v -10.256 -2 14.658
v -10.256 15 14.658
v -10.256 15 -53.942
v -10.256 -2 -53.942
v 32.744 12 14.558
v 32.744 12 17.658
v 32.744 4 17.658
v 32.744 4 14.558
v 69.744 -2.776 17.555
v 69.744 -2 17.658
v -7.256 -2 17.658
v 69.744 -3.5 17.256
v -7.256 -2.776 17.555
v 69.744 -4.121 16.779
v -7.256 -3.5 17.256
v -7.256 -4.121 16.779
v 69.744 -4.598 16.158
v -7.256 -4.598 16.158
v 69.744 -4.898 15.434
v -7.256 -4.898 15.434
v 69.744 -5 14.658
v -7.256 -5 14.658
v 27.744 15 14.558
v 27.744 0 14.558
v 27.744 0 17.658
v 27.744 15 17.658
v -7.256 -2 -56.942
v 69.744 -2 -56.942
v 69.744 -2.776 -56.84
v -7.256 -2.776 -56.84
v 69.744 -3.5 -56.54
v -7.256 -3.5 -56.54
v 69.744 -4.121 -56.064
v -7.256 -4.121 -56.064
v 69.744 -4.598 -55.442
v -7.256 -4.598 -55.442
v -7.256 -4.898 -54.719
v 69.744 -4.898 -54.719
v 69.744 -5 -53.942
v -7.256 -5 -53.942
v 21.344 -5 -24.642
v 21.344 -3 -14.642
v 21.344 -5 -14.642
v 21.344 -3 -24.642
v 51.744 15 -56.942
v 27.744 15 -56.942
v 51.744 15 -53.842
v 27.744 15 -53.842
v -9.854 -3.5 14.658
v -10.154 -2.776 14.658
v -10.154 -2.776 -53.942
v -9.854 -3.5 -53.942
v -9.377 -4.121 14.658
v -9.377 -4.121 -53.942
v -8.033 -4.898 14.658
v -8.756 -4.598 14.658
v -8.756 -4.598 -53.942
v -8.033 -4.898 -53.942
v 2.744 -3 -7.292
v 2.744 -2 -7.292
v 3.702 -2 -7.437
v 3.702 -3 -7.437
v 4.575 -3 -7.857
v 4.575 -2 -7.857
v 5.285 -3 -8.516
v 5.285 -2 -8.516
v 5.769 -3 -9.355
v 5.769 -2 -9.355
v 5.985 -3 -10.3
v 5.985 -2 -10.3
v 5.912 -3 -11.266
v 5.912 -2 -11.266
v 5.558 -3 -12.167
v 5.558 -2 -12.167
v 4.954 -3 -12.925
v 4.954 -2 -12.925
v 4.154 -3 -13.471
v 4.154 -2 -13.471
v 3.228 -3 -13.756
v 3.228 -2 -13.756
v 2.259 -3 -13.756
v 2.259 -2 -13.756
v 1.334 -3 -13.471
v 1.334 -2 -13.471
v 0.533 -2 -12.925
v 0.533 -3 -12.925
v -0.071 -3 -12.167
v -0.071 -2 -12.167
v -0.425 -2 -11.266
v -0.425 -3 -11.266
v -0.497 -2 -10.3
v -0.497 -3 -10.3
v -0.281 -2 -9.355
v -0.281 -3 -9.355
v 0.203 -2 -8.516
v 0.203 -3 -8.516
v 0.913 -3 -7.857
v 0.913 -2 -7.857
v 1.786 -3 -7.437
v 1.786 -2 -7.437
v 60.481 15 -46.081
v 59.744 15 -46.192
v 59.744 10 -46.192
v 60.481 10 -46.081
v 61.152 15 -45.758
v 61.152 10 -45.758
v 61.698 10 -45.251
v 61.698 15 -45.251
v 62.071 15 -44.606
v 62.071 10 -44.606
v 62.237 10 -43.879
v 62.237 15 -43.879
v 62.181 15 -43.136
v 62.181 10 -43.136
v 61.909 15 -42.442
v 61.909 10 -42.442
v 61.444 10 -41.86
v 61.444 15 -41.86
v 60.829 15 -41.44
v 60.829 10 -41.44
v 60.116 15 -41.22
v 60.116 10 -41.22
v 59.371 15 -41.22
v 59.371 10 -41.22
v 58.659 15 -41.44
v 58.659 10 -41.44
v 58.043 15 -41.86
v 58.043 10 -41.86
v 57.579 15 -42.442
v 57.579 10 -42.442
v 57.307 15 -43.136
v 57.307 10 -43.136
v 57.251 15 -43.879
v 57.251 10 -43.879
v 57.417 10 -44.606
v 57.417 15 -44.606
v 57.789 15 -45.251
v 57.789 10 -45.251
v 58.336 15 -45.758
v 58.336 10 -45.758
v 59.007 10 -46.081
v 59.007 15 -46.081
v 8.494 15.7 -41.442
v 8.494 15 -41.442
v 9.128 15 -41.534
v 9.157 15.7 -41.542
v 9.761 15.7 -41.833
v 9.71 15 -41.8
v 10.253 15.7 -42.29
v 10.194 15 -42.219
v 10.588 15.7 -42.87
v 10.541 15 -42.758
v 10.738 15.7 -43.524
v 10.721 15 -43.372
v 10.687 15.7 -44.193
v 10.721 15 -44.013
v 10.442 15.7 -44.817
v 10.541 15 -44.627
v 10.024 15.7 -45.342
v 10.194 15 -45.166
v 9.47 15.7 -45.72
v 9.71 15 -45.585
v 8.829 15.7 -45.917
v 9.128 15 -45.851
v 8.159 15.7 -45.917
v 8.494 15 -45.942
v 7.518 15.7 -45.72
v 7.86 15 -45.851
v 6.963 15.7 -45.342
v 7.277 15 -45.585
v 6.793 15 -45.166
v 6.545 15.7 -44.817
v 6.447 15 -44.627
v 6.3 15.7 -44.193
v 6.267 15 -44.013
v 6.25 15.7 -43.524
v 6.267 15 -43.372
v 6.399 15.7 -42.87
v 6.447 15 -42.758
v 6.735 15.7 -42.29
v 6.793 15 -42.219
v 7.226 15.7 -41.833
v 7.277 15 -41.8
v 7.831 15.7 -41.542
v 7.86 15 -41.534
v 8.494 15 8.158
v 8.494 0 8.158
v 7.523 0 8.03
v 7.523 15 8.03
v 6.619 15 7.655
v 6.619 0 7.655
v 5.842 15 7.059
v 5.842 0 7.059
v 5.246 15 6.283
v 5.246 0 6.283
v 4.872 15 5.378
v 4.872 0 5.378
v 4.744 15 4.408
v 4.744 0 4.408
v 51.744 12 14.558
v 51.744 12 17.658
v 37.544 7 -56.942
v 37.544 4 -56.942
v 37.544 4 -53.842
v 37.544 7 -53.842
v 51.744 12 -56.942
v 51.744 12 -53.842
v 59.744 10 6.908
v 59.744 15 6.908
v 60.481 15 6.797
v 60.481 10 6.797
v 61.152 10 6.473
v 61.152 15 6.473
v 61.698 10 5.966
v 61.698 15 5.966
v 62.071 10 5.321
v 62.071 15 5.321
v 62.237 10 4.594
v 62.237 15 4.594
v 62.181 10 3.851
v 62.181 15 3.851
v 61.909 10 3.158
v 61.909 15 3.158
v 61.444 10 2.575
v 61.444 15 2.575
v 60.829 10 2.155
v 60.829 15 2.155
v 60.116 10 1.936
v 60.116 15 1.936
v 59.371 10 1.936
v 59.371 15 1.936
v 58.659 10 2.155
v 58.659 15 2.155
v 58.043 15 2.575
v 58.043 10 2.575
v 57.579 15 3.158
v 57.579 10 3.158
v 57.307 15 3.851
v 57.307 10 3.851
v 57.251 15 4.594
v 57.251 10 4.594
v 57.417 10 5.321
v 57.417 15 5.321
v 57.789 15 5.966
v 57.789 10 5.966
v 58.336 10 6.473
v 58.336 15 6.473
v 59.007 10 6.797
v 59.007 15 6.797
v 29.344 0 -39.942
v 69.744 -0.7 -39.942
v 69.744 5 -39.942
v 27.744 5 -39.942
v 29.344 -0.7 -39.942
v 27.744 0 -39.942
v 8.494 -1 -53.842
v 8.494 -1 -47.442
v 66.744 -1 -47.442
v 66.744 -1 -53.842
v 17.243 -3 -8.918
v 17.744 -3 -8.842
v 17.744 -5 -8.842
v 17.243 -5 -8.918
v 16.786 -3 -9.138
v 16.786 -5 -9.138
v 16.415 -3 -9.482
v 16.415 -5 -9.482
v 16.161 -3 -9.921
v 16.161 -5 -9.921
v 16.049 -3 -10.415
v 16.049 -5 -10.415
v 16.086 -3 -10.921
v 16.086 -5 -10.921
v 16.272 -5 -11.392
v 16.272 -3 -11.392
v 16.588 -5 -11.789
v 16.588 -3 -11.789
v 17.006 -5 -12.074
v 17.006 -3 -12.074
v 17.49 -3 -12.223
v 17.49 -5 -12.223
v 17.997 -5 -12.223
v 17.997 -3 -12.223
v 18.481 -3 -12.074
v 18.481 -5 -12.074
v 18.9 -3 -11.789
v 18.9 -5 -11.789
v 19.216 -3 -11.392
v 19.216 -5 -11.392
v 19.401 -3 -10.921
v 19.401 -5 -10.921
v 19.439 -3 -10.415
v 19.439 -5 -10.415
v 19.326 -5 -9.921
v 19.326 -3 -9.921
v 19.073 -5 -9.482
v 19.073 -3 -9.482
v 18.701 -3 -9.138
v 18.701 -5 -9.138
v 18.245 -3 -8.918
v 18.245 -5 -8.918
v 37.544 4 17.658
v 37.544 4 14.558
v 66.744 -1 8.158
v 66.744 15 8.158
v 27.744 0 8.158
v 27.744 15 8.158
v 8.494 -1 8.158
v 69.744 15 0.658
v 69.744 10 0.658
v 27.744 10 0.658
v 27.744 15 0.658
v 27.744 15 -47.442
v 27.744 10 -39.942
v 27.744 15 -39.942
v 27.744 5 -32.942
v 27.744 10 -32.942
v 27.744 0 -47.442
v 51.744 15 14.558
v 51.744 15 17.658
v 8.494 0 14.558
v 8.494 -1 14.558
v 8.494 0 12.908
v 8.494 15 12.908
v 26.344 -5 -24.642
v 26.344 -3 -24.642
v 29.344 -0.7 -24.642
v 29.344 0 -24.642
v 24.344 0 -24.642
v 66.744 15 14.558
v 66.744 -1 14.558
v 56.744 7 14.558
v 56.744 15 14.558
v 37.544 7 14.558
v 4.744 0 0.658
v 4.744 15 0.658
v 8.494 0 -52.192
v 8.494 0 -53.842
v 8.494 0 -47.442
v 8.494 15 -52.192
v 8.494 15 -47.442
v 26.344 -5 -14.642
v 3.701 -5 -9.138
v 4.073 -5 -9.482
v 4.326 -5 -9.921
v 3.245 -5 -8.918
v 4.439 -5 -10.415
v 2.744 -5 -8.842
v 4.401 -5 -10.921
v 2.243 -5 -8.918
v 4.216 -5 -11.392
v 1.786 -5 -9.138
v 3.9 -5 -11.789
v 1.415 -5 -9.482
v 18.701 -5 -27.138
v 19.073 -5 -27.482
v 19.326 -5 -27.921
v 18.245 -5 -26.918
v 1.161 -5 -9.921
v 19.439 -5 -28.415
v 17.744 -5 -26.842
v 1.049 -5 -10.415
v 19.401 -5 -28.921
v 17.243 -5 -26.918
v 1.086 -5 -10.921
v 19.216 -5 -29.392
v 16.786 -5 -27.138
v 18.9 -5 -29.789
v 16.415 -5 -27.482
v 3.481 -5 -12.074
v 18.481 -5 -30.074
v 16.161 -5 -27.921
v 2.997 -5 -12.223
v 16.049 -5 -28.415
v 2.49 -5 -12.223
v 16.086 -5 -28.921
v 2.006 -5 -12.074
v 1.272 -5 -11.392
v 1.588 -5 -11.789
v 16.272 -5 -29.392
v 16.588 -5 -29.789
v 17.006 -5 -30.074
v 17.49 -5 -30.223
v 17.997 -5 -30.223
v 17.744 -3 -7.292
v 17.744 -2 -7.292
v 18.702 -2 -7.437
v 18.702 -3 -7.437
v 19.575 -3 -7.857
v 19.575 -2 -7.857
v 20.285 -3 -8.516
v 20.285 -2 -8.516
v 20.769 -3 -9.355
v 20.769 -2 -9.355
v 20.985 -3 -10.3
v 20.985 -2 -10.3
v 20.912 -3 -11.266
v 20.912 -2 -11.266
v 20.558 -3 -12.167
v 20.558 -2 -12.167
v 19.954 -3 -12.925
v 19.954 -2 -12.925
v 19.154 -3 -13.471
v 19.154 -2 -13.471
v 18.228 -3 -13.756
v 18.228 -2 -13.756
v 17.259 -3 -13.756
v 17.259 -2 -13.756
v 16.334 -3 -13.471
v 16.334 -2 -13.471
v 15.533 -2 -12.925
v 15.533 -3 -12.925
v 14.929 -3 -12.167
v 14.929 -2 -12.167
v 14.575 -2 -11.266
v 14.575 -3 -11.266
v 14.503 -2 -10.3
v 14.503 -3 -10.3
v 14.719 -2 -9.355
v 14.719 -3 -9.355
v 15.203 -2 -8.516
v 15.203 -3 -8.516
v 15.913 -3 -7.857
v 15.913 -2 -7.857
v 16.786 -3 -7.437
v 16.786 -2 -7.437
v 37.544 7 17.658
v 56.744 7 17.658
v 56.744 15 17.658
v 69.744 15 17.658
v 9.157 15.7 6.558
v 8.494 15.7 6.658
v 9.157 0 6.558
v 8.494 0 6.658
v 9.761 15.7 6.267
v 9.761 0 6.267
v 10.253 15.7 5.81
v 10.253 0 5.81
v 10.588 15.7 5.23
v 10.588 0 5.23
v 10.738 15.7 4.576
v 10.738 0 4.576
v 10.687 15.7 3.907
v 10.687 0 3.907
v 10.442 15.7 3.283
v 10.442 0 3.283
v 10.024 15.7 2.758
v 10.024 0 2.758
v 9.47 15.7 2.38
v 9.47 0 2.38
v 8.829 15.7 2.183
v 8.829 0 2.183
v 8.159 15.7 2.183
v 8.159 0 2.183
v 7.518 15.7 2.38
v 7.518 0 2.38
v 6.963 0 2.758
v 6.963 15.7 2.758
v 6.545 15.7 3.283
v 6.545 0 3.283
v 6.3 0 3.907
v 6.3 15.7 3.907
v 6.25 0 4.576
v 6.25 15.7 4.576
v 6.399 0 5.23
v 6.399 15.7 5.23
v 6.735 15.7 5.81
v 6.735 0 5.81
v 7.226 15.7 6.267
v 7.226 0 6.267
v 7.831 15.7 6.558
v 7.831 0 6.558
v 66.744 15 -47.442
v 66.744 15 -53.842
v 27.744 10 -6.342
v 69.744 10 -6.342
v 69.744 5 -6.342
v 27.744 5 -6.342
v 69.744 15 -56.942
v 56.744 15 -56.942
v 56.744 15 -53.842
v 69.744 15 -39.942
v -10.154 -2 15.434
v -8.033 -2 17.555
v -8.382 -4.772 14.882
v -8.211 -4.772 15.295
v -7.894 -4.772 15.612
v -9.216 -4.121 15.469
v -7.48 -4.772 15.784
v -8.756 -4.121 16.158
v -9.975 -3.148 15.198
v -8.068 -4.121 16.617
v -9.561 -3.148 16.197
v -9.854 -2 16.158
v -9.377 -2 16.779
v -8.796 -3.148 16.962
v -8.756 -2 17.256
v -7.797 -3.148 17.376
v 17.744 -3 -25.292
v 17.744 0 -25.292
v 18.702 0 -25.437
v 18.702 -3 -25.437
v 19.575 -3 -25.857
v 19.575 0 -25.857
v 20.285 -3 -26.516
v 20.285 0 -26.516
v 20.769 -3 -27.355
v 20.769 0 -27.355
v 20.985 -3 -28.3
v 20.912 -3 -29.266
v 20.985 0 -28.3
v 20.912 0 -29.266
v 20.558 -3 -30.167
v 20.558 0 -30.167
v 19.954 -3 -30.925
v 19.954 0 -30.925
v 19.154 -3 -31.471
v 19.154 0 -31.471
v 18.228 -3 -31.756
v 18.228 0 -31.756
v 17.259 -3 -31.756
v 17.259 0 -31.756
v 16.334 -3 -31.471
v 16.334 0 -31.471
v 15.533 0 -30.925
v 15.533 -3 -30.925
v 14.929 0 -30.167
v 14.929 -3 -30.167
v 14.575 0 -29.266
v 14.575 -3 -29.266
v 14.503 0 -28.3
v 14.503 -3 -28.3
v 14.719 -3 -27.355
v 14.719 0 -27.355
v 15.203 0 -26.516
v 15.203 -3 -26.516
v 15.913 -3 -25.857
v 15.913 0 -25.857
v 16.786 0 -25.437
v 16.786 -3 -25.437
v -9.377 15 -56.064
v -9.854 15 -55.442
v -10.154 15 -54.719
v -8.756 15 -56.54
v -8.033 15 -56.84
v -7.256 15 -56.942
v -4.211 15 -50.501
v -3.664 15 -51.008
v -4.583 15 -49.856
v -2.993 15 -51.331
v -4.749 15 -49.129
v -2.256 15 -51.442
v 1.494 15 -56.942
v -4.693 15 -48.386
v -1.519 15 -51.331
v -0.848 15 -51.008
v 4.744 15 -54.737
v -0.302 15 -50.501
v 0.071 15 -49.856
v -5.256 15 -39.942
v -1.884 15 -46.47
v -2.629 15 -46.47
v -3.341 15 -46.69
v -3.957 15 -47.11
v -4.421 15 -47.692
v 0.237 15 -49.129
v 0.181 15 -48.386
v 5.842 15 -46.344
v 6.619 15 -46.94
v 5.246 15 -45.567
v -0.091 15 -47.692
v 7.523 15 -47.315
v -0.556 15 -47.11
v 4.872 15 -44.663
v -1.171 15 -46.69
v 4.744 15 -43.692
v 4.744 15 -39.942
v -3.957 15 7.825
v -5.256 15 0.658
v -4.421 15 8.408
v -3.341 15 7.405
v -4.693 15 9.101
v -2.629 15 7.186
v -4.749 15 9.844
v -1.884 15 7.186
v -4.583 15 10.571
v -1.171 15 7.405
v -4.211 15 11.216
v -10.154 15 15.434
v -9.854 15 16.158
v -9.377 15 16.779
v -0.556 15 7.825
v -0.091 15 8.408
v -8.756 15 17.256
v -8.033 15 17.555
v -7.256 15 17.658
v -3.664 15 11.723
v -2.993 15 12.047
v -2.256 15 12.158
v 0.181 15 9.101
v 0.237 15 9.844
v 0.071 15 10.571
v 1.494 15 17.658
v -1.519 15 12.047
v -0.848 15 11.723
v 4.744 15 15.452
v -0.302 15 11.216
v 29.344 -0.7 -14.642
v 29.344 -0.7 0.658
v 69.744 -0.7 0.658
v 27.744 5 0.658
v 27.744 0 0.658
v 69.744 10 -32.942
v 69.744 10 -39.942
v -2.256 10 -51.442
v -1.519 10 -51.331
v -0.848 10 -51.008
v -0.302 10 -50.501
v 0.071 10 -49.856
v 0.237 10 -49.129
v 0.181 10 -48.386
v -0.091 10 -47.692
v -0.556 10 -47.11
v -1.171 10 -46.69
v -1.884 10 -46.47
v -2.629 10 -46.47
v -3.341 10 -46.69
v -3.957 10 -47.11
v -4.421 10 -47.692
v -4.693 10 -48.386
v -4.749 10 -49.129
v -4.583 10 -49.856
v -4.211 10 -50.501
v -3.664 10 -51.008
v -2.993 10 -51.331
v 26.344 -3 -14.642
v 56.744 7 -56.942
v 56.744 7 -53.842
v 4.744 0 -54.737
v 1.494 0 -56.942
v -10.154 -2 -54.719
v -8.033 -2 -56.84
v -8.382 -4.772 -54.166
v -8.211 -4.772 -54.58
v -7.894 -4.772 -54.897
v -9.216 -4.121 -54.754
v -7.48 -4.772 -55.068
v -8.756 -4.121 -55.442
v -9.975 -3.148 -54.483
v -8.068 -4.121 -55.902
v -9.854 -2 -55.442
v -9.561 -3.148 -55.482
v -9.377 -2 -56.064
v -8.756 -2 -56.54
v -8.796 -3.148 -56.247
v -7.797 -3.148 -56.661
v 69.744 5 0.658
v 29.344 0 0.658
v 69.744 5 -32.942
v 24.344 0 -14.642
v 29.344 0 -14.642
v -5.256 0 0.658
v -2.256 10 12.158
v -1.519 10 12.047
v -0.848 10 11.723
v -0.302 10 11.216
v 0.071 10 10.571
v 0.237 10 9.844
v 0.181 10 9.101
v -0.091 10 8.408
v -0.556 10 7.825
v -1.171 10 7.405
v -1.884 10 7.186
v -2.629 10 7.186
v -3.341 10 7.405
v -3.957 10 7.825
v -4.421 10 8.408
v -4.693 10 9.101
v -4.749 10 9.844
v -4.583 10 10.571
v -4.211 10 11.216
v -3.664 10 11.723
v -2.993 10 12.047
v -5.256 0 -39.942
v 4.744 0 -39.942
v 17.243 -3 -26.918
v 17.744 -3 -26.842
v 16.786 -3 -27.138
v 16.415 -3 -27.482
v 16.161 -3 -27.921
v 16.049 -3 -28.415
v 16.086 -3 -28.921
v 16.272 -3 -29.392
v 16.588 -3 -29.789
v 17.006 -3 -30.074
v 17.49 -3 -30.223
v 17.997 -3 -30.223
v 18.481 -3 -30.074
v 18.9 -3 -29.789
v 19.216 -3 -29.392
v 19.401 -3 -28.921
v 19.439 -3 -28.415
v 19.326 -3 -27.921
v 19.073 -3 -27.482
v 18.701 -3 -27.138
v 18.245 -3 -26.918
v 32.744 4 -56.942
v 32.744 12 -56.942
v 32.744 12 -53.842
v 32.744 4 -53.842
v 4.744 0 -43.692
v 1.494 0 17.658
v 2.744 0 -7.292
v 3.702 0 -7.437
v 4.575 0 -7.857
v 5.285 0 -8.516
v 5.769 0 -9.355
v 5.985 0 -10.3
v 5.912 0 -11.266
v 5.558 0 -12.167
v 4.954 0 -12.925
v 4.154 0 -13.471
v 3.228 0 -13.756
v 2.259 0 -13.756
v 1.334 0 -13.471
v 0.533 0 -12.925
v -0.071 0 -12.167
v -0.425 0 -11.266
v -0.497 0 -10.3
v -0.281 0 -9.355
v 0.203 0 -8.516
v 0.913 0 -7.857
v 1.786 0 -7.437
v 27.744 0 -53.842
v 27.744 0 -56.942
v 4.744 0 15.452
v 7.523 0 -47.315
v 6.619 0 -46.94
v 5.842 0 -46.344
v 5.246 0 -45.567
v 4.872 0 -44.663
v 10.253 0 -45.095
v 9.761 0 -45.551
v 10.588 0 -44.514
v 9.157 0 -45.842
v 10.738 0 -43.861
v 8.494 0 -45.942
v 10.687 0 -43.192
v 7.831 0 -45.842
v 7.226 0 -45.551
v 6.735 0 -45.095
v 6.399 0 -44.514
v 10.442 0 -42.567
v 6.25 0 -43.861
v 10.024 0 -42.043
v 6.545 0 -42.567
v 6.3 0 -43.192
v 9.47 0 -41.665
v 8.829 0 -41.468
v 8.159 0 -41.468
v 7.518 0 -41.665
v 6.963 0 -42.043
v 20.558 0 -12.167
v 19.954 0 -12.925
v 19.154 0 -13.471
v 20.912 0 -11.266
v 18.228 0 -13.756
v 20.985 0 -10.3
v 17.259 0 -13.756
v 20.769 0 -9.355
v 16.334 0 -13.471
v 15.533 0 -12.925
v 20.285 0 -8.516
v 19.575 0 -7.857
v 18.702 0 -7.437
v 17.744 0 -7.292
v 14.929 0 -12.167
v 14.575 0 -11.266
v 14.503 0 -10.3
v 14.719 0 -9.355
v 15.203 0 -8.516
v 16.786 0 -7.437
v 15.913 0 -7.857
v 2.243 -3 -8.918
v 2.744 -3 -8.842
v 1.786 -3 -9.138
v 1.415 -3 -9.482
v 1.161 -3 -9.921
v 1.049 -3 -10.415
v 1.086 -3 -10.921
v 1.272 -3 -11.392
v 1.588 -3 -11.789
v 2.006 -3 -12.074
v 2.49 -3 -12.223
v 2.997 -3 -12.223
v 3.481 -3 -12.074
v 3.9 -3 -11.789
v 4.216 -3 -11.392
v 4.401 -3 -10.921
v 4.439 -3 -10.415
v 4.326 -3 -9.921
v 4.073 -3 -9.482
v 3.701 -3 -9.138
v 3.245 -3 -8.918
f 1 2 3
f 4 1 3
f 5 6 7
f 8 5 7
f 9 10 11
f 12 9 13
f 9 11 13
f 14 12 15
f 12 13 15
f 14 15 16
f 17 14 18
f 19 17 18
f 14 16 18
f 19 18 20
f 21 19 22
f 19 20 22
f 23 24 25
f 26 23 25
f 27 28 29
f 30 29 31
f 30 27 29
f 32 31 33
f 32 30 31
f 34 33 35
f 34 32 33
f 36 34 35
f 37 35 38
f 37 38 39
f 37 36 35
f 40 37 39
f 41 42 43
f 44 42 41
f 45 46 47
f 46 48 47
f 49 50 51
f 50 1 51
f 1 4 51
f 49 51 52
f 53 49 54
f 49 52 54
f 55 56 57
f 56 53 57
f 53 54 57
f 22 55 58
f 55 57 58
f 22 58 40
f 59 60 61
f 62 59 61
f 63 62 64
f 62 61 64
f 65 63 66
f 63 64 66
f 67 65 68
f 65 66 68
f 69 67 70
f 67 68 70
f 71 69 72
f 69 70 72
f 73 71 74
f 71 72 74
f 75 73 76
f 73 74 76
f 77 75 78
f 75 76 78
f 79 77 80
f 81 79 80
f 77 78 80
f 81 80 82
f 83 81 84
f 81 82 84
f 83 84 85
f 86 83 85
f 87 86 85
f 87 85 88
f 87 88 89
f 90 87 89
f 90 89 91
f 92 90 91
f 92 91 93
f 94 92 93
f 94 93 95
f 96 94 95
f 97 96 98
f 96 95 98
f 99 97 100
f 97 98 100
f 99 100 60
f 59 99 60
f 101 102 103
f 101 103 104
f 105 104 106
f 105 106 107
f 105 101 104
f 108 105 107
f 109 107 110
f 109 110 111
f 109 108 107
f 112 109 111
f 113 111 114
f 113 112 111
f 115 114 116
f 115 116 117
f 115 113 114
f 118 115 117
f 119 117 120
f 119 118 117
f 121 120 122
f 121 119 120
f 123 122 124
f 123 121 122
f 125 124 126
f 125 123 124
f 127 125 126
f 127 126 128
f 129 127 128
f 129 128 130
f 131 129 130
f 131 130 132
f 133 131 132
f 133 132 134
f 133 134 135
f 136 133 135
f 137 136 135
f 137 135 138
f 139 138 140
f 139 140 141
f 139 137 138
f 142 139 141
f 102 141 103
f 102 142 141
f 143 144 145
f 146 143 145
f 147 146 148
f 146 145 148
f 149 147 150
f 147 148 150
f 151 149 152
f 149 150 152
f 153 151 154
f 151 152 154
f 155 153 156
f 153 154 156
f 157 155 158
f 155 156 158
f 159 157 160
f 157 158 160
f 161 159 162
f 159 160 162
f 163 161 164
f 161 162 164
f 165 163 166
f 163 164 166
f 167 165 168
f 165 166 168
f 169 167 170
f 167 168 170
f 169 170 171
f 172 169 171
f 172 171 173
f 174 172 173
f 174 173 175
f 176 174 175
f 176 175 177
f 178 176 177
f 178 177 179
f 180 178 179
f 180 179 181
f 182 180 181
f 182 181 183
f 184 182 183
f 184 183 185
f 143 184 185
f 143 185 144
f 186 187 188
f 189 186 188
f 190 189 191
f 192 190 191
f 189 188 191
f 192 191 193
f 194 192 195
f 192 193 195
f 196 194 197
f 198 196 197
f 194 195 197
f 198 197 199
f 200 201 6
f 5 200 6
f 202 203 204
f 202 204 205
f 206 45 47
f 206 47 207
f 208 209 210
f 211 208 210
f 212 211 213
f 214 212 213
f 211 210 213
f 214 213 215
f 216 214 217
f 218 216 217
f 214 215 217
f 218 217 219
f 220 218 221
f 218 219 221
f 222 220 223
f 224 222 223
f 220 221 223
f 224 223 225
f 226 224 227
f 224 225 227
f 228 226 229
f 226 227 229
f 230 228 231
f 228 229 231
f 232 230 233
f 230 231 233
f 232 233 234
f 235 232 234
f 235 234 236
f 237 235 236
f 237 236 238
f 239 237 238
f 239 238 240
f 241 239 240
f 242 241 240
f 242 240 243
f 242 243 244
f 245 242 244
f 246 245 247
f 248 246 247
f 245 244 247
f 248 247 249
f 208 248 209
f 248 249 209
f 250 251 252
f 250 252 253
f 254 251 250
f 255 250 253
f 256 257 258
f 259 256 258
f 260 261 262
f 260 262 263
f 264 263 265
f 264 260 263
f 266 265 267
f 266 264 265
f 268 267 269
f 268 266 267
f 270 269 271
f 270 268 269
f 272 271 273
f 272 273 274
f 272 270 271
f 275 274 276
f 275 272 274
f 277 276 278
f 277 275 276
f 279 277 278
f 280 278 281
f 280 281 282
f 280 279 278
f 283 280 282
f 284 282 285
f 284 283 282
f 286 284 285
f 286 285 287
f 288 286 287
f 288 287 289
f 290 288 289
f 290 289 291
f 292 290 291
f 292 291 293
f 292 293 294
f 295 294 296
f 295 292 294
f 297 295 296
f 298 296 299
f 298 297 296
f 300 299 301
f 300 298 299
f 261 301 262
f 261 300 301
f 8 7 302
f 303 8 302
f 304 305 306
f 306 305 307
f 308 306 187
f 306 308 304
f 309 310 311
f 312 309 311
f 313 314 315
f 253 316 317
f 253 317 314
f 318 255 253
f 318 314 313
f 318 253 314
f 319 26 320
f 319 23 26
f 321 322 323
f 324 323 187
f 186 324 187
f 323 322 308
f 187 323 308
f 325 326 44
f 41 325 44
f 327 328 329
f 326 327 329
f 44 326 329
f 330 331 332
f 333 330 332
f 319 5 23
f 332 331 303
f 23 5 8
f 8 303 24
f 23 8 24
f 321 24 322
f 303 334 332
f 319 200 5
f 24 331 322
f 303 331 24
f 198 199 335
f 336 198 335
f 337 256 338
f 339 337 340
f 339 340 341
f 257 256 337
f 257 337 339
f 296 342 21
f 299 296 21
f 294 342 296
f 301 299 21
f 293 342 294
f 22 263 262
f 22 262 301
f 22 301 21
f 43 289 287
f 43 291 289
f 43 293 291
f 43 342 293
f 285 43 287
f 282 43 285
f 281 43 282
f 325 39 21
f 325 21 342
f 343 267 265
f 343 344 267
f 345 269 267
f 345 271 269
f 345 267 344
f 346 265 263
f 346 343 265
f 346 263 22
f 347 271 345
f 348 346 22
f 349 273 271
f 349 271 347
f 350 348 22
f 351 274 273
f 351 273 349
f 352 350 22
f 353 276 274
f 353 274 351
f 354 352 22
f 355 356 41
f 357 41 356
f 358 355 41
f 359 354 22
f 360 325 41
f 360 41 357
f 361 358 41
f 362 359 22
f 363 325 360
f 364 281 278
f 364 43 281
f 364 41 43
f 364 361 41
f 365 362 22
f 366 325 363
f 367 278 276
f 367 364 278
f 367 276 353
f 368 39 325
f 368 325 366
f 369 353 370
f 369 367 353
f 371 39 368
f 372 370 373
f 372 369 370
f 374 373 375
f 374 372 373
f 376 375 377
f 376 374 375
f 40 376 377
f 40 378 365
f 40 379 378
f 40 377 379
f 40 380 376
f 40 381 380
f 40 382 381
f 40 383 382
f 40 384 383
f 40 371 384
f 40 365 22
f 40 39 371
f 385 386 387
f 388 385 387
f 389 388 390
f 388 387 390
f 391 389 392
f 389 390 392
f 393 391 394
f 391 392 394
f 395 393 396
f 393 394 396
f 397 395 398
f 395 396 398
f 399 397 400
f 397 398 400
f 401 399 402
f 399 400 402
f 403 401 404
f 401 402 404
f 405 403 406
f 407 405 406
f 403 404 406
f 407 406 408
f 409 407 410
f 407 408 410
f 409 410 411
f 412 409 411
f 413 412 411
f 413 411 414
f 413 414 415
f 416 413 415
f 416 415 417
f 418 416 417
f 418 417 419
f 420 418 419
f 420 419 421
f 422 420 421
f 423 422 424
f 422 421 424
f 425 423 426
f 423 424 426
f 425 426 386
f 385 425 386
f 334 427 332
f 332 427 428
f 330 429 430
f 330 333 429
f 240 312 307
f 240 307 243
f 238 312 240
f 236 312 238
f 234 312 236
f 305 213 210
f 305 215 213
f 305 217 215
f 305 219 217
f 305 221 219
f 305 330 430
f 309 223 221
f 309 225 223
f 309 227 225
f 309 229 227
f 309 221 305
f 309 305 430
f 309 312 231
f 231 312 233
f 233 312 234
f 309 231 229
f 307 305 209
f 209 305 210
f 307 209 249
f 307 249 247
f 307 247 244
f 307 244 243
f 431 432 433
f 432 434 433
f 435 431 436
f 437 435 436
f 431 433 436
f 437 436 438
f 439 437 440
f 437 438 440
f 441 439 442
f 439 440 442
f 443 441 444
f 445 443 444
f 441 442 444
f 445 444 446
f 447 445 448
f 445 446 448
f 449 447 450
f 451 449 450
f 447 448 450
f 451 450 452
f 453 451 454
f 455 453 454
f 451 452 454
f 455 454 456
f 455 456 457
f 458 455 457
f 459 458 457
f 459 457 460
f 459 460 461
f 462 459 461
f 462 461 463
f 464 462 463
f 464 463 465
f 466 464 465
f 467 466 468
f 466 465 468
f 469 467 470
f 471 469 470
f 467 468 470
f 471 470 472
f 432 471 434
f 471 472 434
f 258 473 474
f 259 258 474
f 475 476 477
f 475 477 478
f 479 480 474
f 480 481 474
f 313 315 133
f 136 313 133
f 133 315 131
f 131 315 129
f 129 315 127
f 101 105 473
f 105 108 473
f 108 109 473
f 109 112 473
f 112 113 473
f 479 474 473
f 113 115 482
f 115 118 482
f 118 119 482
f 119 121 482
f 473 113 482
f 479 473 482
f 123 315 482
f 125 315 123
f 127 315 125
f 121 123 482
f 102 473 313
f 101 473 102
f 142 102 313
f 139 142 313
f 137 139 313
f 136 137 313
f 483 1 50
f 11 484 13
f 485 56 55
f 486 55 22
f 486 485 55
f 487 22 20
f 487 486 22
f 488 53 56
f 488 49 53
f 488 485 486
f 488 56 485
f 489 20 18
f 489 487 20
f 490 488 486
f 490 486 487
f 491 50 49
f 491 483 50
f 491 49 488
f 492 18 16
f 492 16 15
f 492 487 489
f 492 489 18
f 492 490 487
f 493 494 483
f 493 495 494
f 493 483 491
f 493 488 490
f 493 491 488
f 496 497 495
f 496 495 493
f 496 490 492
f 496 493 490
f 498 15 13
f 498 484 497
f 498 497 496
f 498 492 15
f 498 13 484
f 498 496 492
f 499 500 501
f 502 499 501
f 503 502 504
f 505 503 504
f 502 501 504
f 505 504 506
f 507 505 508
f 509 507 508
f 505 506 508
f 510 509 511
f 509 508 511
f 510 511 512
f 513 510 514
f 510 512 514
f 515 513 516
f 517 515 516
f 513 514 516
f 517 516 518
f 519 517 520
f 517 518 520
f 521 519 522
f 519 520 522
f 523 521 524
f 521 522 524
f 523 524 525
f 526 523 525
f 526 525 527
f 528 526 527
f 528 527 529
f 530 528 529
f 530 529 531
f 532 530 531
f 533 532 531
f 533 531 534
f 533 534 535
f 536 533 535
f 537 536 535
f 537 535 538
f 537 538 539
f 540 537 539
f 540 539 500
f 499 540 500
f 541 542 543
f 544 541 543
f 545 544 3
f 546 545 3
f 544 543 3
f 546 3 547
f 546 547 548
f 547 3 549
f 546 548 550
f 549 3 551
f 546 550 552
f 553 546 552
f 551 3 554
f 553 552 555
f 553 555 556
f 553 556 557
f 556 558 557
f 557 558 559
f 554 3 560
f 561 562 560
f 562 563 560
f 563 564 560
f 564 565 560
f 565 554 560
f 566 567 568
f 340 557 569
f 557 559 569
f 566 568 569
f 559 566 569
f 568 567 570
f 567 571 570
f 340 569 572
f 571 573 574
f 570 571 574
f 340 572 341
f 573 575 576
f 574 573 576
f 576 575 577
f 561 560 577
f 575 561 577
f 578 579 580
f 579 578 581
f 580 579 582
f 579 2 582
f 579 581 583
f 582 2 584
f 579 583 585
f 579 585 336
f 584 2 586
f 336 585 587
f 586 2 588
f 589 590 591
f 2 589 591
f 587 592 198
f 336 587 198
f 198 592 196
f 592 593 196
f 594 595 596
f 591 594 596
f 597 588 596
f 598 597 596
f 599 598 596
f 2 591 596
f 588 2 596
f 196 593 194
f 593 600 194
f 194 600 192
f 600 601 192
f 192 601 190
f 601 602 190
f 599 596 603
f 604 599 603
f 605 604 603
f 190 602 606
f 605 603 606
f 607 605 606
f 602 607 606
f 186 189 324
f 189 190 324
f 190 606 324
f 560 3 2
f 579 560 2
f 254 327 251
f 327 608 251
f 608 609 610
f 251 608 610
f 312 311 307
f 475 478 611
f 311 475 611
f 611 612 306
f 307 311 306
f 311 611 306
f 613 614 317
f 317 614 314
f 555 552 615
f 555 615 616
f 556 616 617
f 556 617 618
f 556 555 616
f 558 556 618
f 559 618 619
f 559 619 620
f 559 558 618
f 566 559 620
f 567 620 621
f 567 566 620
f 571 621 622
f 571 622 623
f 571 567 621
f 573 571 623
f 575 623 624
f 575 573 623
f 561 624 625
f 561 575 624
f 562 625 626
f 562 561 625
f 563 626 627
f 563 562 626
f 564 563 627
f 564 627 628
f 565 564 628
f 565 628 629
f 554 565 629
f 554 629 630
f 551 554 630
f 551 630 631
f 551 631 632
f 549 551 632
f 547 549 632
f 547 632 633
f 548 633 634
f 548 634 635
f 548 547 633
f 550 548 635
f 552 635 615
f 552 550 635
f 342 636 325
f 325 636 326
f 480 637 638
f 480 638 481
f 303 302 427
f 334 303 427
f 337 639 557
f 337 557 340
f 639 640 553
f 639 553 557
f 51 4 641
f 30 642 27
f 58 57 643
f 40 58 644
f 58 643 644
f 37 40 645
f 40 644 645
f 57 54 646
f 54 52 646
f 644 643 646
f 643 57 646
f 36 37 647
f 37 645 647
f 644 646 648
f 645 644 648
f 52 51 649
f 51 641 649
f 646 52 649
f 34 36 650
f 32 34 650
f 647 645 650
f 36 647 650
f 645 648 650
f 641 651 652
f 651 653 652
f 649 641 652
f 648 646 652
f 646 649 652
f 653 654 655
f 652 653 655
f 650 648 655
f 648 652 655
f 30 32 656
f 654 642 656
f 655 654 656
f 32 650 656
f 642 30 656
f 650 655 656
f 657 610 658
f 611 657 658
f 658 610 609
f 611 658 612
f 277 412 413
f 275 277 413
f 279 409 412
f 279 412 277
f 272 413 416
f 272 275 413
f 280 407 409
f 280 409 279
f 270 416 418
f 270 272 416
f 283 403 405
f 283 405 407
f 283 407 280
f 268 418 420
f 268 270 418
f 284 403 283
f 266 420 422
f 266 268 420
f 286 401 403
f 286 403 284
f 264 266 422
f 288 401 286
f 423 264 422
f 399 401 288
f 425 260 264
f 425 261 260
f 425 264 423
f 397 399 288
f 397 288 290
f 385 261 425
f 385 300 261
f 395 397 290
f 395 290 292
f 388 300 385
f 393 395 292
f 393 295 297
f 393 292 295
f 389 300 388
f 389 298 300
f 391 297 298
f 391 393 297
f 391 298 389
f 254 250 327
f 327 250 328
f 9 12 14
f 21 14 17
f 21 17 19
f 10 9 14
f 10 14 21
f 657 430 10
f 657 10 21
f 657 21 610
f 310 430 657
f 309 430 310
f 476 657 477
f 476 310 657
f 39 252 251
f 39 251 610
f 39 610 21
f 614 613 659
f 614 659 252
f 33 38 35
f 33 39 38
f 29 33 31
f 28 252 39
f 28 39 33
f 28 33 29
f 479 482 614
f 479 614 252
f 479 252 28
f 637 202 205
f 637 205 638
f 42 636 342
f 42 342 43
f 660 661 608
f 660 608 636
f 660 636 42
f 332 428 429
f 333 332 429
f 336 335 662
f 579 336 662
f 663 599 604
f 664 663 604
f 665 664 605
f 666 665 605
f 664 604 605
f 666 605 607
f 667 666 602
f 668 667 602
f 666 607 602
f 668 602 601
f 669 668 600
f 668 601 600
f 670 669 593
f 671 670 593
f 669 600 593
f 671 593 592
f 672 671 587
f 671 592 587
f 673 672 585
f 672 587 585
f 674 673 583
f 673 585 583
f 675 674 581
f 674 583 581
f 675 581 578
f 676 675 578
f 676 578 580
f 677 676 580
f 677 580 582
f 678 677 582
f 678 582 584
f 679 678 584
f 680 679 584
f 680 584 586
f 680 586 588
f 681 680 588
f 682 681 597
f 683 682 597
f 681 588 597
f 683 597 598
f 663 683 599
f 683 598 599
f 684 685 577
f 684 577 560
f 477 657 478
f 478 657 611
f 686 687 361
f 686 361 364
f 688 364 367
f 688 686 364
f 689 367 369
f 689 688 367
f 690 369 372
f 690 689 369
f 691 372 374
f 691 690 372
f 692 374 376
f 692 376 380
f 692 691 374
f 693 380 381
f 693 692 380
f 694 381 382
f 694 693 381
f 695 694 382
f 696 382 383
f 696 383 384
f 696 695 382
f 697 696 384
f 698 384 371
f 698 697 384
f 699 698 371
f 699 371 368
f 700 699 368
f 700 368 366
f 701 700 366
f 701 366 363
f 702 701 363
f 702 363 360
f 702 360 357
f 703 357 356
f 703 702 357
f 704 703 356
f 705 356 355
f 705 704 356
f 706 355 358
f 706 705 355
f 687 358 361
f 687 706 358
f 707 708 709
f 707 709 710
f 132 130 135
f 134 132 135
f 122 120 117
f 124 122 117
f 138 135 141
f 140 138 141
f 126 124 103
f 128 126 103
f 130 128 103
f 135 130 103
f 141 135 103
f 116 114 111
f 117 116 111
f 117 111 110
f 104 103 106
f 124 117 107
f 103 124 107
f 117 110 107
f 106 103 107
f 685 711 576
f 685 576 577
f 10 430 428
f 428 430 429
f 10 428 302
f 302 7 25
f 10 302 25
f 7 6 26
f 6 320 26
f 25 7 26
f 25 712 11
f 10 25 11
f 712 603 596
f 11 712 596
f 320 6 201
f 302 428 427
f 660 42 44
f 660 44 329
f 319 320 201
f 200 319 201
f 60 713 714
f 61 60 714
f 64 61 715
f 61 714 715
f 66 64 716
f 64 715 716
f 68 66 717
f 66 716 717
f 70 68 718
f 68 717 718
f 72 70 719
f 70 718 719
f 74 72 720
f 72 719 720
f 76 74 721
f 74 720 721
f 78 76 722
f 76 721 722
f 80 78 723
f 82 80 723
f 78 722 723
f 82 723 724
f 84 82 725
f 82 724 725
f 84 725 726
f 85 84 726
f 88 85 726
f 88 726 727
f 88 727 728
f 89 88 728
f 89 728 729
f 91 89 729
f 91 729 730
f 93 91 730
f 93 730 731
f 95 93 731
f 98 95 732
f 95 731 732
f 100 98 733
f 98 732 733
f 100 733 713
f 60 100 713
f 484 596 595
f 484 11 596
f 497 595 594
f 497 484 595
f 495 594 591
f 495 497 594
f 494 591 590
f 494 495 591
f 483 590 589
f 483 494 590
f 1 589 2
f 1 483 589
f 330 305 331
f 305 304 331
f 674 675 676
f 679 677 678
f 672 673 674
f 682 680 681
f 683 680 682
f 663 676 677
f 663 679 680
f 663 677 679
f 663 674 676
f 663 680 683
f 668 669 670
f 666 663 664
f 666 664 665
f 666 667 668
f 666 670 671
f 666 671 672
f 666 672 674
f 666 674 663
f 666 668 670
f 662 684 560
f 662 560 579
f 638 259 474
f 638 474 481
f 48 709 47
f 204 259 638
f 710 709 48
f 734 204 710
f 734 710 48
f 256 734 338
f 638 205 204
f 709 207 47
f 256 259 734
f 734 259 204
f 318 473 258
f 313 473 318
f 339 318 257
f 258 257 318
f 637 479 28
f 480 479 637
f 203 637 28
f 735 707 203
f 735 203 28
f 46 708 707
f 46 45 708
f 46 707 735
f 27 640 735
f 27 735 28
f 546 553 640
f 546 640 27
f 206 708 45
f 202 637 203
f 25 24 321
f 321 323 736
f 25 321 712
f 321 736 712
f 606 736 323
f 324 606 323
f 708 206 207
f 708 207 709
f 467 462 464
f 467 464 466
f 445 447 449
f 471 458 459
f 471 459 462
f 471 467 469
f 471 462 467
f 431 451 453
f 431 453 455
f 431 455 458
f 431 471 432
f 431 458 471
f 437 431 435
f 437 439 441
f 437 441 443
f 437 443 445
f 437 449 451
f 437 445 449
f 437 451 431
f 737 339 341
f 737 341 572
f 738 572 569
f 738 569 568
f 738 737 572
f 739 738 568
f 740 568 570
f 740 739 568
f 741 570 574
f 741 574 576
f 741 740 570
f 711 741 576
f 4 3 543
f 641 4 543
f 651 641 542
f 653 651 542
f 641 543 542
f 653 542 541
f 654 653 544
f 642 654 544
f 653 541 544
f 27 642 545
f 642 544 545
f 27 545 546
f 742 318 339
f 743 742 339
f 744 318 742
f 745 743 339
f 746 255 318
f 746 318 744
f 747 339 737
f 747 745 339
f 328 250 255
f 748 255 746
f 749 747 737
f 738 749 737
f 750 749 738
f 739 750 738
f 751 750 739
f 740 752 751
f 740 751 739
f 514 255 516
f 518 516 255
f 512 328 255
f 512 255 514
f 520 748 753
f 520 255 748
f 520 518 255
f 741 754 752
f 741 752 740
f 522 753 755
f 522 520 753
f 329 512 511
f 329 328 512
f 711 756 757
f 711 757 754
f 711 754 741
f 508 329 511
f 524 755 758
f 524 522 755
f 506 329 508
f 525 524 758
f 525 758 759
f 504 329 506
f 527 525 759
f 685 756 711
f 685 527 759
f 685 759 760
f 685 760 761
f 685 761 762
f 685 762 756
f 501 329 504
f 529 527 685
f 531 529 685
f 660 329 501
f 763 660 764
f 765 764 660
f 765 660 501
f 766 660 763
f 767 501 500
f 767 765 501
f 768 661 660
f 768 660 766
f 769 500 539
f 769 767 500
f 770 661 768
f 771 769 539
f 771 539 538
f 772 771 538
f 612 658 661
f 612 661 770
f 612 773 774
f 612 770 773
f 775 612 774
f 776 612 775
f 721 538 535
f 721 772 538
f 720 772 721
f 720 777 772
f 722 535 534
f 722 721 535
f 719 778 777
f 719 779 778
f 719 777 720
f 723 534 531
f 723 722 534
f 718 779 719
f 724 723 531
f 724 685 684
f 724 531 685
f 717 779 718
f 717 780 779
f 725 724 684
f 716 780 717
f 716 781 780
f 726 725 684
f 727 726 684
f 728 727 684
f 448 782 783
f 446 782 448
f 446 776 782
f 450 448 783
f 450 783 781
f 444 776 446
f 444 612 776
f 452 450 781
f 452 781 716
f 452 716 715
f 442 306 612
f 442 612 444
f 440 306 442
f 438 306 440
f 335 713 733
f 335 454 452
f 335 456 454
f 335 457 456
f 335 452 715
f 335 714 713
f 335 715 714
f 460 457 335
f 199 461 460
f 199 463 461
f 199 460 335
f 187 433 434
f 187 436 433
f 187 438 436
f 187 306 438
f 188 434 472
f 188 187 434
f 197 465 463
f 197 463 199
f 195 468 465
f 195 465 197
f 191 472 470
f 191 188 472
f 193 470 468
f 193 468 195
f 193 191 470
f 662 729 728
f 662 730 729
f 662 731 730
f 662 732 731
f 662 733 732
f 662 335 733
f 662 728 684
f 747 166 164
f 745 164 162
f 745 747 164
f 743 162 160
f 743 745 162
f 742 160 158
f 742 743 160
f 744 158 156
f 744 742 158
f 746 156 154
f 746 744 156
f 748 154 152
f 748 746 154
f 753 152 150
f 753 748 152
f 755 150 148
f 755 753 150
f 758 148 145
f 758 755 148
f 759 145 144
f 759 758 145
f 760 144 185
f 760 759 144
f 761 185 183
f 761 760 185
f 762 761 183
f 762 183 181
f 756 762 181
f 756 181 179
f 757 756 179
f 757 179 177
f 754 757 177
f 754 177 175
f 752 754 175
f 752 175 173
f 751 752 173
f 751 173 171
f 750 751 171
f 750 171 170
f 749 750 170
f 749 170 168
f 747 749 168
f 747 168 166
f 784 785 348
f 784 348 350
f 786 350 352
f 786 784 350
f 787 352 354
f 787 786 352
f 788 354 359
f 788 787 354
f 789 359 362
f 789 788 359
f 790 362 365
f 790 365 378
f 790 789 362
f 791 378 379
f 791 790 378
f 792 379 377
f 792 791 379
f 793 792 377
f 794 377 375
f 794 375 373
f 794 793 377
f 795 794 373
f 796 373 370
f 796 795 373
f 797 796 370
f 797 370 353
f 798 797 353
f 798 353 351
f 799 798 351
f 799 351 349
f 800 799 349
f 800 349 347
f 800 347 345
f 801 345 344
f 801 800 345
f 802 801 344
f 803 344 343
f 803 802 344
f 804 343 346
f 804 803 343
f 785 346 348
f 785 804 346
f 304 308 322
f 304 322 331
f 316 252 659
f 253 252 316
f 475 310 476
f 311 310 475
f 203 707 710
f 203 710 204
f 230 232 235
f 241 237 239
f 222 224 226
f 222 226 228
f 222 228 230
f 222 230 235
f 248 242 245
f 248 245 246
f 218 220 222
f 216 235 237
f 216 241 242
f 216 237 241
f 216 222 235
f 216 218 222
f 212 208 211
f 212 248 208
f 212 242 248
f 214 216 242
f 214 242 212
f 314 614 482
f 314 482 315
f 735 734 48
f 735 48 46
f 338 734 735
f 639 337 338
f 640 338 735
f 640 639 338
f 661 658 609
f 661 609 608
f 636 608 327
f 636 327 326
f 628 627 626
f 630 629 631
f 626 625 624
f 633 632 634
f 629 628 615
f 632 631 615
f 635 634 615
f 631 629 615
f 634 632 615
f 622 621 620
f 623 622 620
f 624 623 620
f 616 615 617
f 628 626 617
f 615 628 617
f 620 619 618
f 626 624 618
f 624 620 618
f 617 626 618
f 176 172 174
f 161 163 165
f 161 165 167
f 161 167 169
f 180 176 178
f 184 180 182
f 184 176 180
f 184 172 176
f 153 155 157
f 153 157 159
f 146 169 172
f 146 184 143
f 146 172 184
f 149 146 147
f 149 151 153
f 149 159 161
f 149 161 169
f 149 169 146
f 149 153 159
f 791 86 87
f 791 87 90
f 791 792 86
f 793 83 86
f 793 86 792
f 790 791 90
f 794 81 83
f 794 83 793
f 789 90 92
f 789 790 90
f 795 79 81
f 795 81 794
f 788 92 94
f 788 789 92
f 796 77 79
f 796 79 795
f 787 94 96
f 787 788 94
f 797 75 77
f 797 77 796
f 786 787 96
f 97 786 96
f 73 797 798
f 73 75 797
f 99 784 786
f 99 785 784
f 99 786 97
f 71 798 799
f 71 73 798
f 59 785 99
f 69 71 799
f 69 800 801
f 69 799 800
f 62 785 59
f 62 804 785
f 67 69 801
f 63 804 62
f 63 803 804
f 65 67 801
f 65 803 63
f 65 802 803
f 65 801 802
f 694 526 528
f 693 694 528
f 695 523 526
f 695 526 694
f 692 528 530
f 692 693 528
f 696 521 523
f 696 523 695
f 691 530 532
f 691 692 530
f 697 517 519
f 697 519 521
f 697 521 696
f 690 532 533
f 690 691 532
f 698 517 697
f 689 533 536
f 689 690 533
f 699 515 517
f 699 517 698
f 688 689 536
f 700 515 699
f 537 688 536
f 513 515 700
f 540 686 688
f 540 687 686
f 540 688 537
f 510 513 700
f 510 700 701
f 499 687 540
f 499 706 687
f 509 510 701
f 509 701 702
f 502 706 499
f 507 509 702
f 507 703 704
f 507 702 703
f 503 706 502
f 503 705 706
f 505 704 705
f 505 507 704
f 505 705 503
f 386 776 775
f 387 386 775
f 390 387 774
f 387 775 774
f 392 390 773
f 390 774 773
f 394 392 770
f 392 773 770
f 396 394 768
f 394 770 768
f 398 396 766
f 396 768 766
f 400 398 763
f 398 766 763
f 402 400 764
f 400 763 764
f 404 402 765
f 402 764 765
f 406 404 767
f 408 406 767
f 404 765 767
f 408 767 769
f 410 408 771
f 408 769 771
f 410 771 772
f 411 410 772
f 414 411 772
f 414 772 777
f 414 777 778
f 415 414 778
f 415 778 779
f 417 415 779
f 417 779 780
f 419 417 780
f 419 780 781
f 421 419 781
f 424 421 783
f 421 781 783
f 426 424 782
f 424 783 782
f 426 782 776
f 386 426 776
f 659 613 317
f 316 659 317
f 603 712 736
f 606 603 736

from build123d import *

# Parameters (mm, degrees)
SKETCH2_R           = 2.25
BOSS_EXTRUDE1_DEPTH = 15
SKETCH3_W           = 80
SKETCH3_H           = 37.3
BOSS_EXTRUDE2_DEPTH = 3
SKETCH2_6_W         = 39
SKETCH2_6_H         = 6.4
CUT_EXTRUDE1_DEPTH  = 1
CUT_EXTRUDE4_DEPTH  = 3.1
SKETCH5_W           = 42
SKETCH5_H           = 5
BOSS_EXTRUDE3_DEPTH = 7
SKETCH6_W           = 40.4
SKETCH6_H           = 20.3
CUT_EXTRUDE5_DEPTH  = 0.7
CUT_EXTRUDE6_DEPTH  = 5
SKETCH8_R           = 2.5
CUT_EXTRUDE7_DEPTH  = 5
SKETCH9_R           = 3.25
SKETCH9_R_2         = 1.7
CUT_EXTRUDE8_DEPTH  = 2
SKETCH10_R          = 1.7
CUT_EXTRUDE10_DEPTH = 92.27783365
SKETCH11_R          = 2.25
BOSS_EXTRUDE4_DEPTH = 0.7
SKETCH12_R          = 2.25
BOSS_EXTRUDE5_DEPTH = 0.7
SKETCH13_W          = 80
SKETCH13_H          = 74.6
SKETCH13_R          = 1.7
SKETCH13_W_2        = 5
SKETCH13_H_2        = 10
BOSS_EXTRUDE6_DEPTH = 2
FILLET1_R           = 3
SKETCH14_R          = 3.25
CUT_EXTRUDE11_DEPTH = 1


with BuildPart() as part:
    # Sketch2 → Boss-Extrude1 (new body)
    with BuildSketch(Plane(origin=(0, 0, 0), x_dir=(1, 0, 0), z_dir=(0, 1, 0))):
        Polygon((69.743853574, -17.657592215), (69.743853574, -0.657592215), (27.743853574, -0.657592215), (27.743853574, -8.157592215), (66.743853574, -8.157592215), (66.743853574, -14.557592215), (27.743853574, -14.557592215), (27.743853574, -17.657592215), align=None)
        with Locations(Location((8.493853574, -4.407592215, 0), (0, 0, 270))):
            Circle(SKETCH2_R)
        with BuildLine():
            ThreePointArc((8.493853574, -8.157592215), (5.842203145, -7.059242644), (4.743853574, -4.407592215))
            Line((4.743853574, -4.407592215), (4.743853574, -15.452235072))
            Line((4.743853574, -15.452235072), (8.493853574, -12.907592215))
            Line((8.493853574, -12.907592215), (8.493853574, -8.157592215))
        make_face()
        Polygon((-5.256146426, -0.657592215), (-5.256146426, 19.642407785), (-10.256146426, 19.642407785), (-10.256146426, -17.657592215), (1.493853574, -17.657592215), (4.743853574, -15.452235072), (4.743853574, -4.407592215), (4.743853574, -0.657592215), align=None)
    extrude(amount=BOSS_EXTRUDE1_DEPTH)

    # Sketch3 → Boss-Extrude2 (add)
    with BuildSketch(Plane(origin=(0, 0, 0), x_dir=(-1, 0, 0), z_dir=(0, -1, 0))):
        with Locations((-29.743853574, 0.992407785)):
            Rectangle(SKETCH3_W, SKETCH3_H)
    extrude(amount=BOSS_EXTRUDE2_DEPTH)

    # Sketch2<6> → Cut-Extrude1 (cut)
    with BuildSketch(Plane(origin=(0, 0, 0), x_dir=(1, 0, 0), z_dir=(0, 1, 0))):
        Polygon((27.743853574, -8.157592215), (8.493853574, -8.157592215), (8.493853574, -12.907592215), (8.493853574, -14.557592215), (27.743853574, -14.557592215), align=None)
        with Locations((47.243853574, -11.357592215)):
            Rectangle(SKETCH2_6_W, SKETCH2_6_H)
    extrude(amount=-CUT_EXTRUDE1_DEPTH, mode=Mode.SUBTRACT)

    # Sketch4 → Cut-Extrude4 (cut)
    with BuildSketch(Plane.XY.offset(17.657592215)):
        Polygon((37.543853574, 7), (56.743853574, 7), (56.743853574, 15), (51.743853574, 15), (51.743853574, 12), (32.743853574, 12), (32.743853574, 4), (37.543853574, 4), align=None)
    extrude(amount=-CUT_EXTRUDE4_DEPTH, mode=Mode.SUBTRACT)

    # Sketch5 → Boss-Extrude3 (add)
    with BuildSketch(Plane(origin=(0, 0, 0.657592215), x_dir=(-1, 0, 0), z_dir=(0, 0, -1))):
        with Locations((-48.743853574, 7.5)):
            Rectangle(SKETCH5_W, SKETCH5_H)
    extrude(amount=BOSS_EXTRUDE3_DEPTH)

    # Sketch6 → Cut-Extrude5 (cut)
    with BuildSketch(Plane(origin=(0, 0, 0), x_dir=(1, 0, 0), z_dir=(0, 1, 0))):
        with Locations((49.543853574, 9.492407785)):
            Rectangle(SKETCH6_W, SKETCH6_H)
    extrude(amount=-CUT_EXTRUDE5_DEPTH, mode=Mode.SUBTRACT)

    # Sketch7 → Cut-Extrude6 (cut)
    with BuildSketch(Plane(origin=(0, 0, -19.642407785), x_dir=(-1, 0, 0), z_dir=(0, 0, -1))):
        Polygon((-29.343853574, -0.7), (-26.343853574, -3), (-21.343853574, -3), (-24.343853574, 0), (-29.343853574, 0), align=None)
    extrude(amount=-CUT_EXTRUDE6_DEPTH, mode=Mode.SUBTRACT)

    # Sketch8 → Cut-Extrude7 (cut)
    with BuildSketch(Plane(origin=(0, 15, 0), x_dir=(1, 0, 0), z_dir=(0, 1, 0))):
        with Locations(Location((-2.256146426, -9.657592215, 0), (0, 0, 270))):
            Circle(SKETCH8_R)
        with Locations(Location((59.743853574, -4.407592215, 0), (0, 0, 270))):
            Circle(SKETCH8_R)
    extrude(amount=-CUT_EXTRUDE7_DEPTH, mode=Mode.SUBTRACT)

    # Mirror1: part across plane


with BuildPart() as part_1:
    add(part.part)
    add(part.part.mirror(Plane(origin=(-10.256146426, -3, -19.642407785), x_dir=(1, 0, 0), z_dir=(0, 0, 1))))

    # Sketch9 → Cut-Extrude8 (cut)
    # profile 1 of 3: a face of its own
    with BuildSketch(Plane(origin=(0, 0, 0), x_dir=(1, 0, 0), z_dir=(0, 1, 0))):
        with Locations(Location((17.743853574, 28.542407785, 0), (0, 0, 270))):
            Circle(SKETCH9_R)
        with Locations(Location((17.743853574, 28.542407785, 0), (0, 0, 270))):
            Circle(SKETCH9_R_2, mode=Mode.SUBTRACT)
    # profile 2 of 3: a face of its own
    with BuildSketch(Plane(origin=(0, 0, 0), x_dir=(1, 0, 0), z_dir=(0, 1, 0))):
        with Locations(Location((17.743853574, 10.542407785, 0), (0, 0, 270))):
            Circle(SKETCH9_R)
        with Locations(Location((17.743853574, 10.542407785, 0), (0, 0, 270))):
            Circle(SKETCH9_R_2, mode=Mode.SUBTRACT)
    # profile 3 of 3: a face of its own
    with BuildSketch(Plane(origin=(0, 0, 0), x_dir=(1, 0, 0), z_dir=(0, 1, 0))):
        with Locations(Location((2.743853574, 10.542407785, 0), (0, 0, 270))):
            Circle(SKETCH9_R)
        with Locations(Location((2.743853574, 10.542407785, 0), (0, 0, 270))):
            Circle(SKETCH9_R_2, mode=Mode.SUBTRACT)
    extrude(amount=-CUT_EXTRUDE8_DEPTH, mode=Mode.SUBTRACT)

    # Sketch10 → Cut-Extrude10 (cut, through all)
    with BuildSketch(Plane(origin=(0, 0, 0), x_dir=(1, 0, 0), z_dir=(0, 1, 0))):
        with Locations(Location((17.743853574, 28.542407785, 0), (0, 0, 270))):
            Circle(SKETCH10_R)
        with Locations(Location((17.743853574, 10.542407785, 0), (0, 0, 270))):
            Circle(SKETCH10_R)
        with Locations(Location((2.743853574, 10.542407785, 0), (0, 0, 270))):
            Circle(SKETCH10_R)
    extrude(amount=-CUT_EXTRUDE10_DEPTH, mode=Mode.SUBTRACT)

    # Sketch11 → Boss-Extrude4 (add)
    with BuildSketch(Plane(origin=(0, 15, 0), x_dir=(1, 0, 0), z_dir=(0, 1, 0))):
        with Locations(Location((8.493853574, -4.407592215, 0), (0, 0, 270))):
            Circle(SKETCH11_R)
    extrude(amount=BOSS_EXTRUDE4_DEPTH)

    # Sketch12 → Boss-Extrude5 (add)
    with BuildSketch(Plane(origin=(0, 15, 0), x_dir=(1, 0, 0), z_dir=(0, 1, 0))):
        with Locations(Location((8.493853574, 43.692407785, 0), (0, 0, 270))):
            Circle(SKETCH12_R)
    extrude(amount=BOSS_EXTRUDE5_DEPTH)

    # Sketch13 → Boss-Extrude6 (add)
    with BuildSketch(Plane(origin=(0, -3, 0), x_dir=(-1, 0, 0), z_dir=(0, -1, 0))):
        with Locations((-29.743853574, 19.642407785)):
            Rectangle(SKETCH13_W, SKETCH13_H)
        with Locations(Location((-17.743853574, 28.542407785, 0), (0, 0, 270))):
            Circle(SKETCH13_R, mode=Mode.SUBTRACT)
        with Locations(Location((-17.743853574, 10.542407785, 0), (0, 0, 270))):
            Circle(SKETCH13_R, mode=Mode.SUBTRACT)
        with Locations(Location((-2.743853574, 10.542407785, 0), (0, 0, 270))):
            Circle(SKETCH13_R, mode=Mode.SUBTRACT)
        with Locations((-23.843853574, 19.642407785)):
            Rectangle(SKETCH13_W_2, SKETCH13_H_2, mode=Mode.SUBTRACT)
    extrude(amount=BOSS_EXTRUDE6_DEPTH)

    # Fillet1
    fillet1_edges = [part_1.edges().sort_by_distance(p)[0] for p in [
        (-10.256146426, 5, -56.942407785),
        (-10.256146426, 5, 17.657592215),
        (-10.256146426, -5, -19.642407785),
        (29.743853574, -5, -56.942407785),
        (29.743853574, -5, 17.657592215),
    ]]
    fillet(fillet1_edges, radius=FILLET1_R)

    # Sketch14 → Cut-Extrude11 (cut)
    with BuildSketch(Plane(origin=(0, -2, 0), x_dir=(1, 0, 0), z_dir=(0, 1, 0))):
        with Locations(Location((17.743853574, 28.542407785, 0), (0, 0, 270))):
            Circle(SKETCH14_R)
        with Locations(Location((17.743853574, 10.542407785, 0), (0, 0, 270))):
            Circle(SKETCH14_R)
        with Locations(Location((2.743853574, 10.542407785, 0), (0, 0, 270))):
            Circle(SKETCH14_R)
    extrude(amount=-CUT_EXTRUDE11_DEPTH, mode=Mode.SUBTRACT)


solid = part_1.part
